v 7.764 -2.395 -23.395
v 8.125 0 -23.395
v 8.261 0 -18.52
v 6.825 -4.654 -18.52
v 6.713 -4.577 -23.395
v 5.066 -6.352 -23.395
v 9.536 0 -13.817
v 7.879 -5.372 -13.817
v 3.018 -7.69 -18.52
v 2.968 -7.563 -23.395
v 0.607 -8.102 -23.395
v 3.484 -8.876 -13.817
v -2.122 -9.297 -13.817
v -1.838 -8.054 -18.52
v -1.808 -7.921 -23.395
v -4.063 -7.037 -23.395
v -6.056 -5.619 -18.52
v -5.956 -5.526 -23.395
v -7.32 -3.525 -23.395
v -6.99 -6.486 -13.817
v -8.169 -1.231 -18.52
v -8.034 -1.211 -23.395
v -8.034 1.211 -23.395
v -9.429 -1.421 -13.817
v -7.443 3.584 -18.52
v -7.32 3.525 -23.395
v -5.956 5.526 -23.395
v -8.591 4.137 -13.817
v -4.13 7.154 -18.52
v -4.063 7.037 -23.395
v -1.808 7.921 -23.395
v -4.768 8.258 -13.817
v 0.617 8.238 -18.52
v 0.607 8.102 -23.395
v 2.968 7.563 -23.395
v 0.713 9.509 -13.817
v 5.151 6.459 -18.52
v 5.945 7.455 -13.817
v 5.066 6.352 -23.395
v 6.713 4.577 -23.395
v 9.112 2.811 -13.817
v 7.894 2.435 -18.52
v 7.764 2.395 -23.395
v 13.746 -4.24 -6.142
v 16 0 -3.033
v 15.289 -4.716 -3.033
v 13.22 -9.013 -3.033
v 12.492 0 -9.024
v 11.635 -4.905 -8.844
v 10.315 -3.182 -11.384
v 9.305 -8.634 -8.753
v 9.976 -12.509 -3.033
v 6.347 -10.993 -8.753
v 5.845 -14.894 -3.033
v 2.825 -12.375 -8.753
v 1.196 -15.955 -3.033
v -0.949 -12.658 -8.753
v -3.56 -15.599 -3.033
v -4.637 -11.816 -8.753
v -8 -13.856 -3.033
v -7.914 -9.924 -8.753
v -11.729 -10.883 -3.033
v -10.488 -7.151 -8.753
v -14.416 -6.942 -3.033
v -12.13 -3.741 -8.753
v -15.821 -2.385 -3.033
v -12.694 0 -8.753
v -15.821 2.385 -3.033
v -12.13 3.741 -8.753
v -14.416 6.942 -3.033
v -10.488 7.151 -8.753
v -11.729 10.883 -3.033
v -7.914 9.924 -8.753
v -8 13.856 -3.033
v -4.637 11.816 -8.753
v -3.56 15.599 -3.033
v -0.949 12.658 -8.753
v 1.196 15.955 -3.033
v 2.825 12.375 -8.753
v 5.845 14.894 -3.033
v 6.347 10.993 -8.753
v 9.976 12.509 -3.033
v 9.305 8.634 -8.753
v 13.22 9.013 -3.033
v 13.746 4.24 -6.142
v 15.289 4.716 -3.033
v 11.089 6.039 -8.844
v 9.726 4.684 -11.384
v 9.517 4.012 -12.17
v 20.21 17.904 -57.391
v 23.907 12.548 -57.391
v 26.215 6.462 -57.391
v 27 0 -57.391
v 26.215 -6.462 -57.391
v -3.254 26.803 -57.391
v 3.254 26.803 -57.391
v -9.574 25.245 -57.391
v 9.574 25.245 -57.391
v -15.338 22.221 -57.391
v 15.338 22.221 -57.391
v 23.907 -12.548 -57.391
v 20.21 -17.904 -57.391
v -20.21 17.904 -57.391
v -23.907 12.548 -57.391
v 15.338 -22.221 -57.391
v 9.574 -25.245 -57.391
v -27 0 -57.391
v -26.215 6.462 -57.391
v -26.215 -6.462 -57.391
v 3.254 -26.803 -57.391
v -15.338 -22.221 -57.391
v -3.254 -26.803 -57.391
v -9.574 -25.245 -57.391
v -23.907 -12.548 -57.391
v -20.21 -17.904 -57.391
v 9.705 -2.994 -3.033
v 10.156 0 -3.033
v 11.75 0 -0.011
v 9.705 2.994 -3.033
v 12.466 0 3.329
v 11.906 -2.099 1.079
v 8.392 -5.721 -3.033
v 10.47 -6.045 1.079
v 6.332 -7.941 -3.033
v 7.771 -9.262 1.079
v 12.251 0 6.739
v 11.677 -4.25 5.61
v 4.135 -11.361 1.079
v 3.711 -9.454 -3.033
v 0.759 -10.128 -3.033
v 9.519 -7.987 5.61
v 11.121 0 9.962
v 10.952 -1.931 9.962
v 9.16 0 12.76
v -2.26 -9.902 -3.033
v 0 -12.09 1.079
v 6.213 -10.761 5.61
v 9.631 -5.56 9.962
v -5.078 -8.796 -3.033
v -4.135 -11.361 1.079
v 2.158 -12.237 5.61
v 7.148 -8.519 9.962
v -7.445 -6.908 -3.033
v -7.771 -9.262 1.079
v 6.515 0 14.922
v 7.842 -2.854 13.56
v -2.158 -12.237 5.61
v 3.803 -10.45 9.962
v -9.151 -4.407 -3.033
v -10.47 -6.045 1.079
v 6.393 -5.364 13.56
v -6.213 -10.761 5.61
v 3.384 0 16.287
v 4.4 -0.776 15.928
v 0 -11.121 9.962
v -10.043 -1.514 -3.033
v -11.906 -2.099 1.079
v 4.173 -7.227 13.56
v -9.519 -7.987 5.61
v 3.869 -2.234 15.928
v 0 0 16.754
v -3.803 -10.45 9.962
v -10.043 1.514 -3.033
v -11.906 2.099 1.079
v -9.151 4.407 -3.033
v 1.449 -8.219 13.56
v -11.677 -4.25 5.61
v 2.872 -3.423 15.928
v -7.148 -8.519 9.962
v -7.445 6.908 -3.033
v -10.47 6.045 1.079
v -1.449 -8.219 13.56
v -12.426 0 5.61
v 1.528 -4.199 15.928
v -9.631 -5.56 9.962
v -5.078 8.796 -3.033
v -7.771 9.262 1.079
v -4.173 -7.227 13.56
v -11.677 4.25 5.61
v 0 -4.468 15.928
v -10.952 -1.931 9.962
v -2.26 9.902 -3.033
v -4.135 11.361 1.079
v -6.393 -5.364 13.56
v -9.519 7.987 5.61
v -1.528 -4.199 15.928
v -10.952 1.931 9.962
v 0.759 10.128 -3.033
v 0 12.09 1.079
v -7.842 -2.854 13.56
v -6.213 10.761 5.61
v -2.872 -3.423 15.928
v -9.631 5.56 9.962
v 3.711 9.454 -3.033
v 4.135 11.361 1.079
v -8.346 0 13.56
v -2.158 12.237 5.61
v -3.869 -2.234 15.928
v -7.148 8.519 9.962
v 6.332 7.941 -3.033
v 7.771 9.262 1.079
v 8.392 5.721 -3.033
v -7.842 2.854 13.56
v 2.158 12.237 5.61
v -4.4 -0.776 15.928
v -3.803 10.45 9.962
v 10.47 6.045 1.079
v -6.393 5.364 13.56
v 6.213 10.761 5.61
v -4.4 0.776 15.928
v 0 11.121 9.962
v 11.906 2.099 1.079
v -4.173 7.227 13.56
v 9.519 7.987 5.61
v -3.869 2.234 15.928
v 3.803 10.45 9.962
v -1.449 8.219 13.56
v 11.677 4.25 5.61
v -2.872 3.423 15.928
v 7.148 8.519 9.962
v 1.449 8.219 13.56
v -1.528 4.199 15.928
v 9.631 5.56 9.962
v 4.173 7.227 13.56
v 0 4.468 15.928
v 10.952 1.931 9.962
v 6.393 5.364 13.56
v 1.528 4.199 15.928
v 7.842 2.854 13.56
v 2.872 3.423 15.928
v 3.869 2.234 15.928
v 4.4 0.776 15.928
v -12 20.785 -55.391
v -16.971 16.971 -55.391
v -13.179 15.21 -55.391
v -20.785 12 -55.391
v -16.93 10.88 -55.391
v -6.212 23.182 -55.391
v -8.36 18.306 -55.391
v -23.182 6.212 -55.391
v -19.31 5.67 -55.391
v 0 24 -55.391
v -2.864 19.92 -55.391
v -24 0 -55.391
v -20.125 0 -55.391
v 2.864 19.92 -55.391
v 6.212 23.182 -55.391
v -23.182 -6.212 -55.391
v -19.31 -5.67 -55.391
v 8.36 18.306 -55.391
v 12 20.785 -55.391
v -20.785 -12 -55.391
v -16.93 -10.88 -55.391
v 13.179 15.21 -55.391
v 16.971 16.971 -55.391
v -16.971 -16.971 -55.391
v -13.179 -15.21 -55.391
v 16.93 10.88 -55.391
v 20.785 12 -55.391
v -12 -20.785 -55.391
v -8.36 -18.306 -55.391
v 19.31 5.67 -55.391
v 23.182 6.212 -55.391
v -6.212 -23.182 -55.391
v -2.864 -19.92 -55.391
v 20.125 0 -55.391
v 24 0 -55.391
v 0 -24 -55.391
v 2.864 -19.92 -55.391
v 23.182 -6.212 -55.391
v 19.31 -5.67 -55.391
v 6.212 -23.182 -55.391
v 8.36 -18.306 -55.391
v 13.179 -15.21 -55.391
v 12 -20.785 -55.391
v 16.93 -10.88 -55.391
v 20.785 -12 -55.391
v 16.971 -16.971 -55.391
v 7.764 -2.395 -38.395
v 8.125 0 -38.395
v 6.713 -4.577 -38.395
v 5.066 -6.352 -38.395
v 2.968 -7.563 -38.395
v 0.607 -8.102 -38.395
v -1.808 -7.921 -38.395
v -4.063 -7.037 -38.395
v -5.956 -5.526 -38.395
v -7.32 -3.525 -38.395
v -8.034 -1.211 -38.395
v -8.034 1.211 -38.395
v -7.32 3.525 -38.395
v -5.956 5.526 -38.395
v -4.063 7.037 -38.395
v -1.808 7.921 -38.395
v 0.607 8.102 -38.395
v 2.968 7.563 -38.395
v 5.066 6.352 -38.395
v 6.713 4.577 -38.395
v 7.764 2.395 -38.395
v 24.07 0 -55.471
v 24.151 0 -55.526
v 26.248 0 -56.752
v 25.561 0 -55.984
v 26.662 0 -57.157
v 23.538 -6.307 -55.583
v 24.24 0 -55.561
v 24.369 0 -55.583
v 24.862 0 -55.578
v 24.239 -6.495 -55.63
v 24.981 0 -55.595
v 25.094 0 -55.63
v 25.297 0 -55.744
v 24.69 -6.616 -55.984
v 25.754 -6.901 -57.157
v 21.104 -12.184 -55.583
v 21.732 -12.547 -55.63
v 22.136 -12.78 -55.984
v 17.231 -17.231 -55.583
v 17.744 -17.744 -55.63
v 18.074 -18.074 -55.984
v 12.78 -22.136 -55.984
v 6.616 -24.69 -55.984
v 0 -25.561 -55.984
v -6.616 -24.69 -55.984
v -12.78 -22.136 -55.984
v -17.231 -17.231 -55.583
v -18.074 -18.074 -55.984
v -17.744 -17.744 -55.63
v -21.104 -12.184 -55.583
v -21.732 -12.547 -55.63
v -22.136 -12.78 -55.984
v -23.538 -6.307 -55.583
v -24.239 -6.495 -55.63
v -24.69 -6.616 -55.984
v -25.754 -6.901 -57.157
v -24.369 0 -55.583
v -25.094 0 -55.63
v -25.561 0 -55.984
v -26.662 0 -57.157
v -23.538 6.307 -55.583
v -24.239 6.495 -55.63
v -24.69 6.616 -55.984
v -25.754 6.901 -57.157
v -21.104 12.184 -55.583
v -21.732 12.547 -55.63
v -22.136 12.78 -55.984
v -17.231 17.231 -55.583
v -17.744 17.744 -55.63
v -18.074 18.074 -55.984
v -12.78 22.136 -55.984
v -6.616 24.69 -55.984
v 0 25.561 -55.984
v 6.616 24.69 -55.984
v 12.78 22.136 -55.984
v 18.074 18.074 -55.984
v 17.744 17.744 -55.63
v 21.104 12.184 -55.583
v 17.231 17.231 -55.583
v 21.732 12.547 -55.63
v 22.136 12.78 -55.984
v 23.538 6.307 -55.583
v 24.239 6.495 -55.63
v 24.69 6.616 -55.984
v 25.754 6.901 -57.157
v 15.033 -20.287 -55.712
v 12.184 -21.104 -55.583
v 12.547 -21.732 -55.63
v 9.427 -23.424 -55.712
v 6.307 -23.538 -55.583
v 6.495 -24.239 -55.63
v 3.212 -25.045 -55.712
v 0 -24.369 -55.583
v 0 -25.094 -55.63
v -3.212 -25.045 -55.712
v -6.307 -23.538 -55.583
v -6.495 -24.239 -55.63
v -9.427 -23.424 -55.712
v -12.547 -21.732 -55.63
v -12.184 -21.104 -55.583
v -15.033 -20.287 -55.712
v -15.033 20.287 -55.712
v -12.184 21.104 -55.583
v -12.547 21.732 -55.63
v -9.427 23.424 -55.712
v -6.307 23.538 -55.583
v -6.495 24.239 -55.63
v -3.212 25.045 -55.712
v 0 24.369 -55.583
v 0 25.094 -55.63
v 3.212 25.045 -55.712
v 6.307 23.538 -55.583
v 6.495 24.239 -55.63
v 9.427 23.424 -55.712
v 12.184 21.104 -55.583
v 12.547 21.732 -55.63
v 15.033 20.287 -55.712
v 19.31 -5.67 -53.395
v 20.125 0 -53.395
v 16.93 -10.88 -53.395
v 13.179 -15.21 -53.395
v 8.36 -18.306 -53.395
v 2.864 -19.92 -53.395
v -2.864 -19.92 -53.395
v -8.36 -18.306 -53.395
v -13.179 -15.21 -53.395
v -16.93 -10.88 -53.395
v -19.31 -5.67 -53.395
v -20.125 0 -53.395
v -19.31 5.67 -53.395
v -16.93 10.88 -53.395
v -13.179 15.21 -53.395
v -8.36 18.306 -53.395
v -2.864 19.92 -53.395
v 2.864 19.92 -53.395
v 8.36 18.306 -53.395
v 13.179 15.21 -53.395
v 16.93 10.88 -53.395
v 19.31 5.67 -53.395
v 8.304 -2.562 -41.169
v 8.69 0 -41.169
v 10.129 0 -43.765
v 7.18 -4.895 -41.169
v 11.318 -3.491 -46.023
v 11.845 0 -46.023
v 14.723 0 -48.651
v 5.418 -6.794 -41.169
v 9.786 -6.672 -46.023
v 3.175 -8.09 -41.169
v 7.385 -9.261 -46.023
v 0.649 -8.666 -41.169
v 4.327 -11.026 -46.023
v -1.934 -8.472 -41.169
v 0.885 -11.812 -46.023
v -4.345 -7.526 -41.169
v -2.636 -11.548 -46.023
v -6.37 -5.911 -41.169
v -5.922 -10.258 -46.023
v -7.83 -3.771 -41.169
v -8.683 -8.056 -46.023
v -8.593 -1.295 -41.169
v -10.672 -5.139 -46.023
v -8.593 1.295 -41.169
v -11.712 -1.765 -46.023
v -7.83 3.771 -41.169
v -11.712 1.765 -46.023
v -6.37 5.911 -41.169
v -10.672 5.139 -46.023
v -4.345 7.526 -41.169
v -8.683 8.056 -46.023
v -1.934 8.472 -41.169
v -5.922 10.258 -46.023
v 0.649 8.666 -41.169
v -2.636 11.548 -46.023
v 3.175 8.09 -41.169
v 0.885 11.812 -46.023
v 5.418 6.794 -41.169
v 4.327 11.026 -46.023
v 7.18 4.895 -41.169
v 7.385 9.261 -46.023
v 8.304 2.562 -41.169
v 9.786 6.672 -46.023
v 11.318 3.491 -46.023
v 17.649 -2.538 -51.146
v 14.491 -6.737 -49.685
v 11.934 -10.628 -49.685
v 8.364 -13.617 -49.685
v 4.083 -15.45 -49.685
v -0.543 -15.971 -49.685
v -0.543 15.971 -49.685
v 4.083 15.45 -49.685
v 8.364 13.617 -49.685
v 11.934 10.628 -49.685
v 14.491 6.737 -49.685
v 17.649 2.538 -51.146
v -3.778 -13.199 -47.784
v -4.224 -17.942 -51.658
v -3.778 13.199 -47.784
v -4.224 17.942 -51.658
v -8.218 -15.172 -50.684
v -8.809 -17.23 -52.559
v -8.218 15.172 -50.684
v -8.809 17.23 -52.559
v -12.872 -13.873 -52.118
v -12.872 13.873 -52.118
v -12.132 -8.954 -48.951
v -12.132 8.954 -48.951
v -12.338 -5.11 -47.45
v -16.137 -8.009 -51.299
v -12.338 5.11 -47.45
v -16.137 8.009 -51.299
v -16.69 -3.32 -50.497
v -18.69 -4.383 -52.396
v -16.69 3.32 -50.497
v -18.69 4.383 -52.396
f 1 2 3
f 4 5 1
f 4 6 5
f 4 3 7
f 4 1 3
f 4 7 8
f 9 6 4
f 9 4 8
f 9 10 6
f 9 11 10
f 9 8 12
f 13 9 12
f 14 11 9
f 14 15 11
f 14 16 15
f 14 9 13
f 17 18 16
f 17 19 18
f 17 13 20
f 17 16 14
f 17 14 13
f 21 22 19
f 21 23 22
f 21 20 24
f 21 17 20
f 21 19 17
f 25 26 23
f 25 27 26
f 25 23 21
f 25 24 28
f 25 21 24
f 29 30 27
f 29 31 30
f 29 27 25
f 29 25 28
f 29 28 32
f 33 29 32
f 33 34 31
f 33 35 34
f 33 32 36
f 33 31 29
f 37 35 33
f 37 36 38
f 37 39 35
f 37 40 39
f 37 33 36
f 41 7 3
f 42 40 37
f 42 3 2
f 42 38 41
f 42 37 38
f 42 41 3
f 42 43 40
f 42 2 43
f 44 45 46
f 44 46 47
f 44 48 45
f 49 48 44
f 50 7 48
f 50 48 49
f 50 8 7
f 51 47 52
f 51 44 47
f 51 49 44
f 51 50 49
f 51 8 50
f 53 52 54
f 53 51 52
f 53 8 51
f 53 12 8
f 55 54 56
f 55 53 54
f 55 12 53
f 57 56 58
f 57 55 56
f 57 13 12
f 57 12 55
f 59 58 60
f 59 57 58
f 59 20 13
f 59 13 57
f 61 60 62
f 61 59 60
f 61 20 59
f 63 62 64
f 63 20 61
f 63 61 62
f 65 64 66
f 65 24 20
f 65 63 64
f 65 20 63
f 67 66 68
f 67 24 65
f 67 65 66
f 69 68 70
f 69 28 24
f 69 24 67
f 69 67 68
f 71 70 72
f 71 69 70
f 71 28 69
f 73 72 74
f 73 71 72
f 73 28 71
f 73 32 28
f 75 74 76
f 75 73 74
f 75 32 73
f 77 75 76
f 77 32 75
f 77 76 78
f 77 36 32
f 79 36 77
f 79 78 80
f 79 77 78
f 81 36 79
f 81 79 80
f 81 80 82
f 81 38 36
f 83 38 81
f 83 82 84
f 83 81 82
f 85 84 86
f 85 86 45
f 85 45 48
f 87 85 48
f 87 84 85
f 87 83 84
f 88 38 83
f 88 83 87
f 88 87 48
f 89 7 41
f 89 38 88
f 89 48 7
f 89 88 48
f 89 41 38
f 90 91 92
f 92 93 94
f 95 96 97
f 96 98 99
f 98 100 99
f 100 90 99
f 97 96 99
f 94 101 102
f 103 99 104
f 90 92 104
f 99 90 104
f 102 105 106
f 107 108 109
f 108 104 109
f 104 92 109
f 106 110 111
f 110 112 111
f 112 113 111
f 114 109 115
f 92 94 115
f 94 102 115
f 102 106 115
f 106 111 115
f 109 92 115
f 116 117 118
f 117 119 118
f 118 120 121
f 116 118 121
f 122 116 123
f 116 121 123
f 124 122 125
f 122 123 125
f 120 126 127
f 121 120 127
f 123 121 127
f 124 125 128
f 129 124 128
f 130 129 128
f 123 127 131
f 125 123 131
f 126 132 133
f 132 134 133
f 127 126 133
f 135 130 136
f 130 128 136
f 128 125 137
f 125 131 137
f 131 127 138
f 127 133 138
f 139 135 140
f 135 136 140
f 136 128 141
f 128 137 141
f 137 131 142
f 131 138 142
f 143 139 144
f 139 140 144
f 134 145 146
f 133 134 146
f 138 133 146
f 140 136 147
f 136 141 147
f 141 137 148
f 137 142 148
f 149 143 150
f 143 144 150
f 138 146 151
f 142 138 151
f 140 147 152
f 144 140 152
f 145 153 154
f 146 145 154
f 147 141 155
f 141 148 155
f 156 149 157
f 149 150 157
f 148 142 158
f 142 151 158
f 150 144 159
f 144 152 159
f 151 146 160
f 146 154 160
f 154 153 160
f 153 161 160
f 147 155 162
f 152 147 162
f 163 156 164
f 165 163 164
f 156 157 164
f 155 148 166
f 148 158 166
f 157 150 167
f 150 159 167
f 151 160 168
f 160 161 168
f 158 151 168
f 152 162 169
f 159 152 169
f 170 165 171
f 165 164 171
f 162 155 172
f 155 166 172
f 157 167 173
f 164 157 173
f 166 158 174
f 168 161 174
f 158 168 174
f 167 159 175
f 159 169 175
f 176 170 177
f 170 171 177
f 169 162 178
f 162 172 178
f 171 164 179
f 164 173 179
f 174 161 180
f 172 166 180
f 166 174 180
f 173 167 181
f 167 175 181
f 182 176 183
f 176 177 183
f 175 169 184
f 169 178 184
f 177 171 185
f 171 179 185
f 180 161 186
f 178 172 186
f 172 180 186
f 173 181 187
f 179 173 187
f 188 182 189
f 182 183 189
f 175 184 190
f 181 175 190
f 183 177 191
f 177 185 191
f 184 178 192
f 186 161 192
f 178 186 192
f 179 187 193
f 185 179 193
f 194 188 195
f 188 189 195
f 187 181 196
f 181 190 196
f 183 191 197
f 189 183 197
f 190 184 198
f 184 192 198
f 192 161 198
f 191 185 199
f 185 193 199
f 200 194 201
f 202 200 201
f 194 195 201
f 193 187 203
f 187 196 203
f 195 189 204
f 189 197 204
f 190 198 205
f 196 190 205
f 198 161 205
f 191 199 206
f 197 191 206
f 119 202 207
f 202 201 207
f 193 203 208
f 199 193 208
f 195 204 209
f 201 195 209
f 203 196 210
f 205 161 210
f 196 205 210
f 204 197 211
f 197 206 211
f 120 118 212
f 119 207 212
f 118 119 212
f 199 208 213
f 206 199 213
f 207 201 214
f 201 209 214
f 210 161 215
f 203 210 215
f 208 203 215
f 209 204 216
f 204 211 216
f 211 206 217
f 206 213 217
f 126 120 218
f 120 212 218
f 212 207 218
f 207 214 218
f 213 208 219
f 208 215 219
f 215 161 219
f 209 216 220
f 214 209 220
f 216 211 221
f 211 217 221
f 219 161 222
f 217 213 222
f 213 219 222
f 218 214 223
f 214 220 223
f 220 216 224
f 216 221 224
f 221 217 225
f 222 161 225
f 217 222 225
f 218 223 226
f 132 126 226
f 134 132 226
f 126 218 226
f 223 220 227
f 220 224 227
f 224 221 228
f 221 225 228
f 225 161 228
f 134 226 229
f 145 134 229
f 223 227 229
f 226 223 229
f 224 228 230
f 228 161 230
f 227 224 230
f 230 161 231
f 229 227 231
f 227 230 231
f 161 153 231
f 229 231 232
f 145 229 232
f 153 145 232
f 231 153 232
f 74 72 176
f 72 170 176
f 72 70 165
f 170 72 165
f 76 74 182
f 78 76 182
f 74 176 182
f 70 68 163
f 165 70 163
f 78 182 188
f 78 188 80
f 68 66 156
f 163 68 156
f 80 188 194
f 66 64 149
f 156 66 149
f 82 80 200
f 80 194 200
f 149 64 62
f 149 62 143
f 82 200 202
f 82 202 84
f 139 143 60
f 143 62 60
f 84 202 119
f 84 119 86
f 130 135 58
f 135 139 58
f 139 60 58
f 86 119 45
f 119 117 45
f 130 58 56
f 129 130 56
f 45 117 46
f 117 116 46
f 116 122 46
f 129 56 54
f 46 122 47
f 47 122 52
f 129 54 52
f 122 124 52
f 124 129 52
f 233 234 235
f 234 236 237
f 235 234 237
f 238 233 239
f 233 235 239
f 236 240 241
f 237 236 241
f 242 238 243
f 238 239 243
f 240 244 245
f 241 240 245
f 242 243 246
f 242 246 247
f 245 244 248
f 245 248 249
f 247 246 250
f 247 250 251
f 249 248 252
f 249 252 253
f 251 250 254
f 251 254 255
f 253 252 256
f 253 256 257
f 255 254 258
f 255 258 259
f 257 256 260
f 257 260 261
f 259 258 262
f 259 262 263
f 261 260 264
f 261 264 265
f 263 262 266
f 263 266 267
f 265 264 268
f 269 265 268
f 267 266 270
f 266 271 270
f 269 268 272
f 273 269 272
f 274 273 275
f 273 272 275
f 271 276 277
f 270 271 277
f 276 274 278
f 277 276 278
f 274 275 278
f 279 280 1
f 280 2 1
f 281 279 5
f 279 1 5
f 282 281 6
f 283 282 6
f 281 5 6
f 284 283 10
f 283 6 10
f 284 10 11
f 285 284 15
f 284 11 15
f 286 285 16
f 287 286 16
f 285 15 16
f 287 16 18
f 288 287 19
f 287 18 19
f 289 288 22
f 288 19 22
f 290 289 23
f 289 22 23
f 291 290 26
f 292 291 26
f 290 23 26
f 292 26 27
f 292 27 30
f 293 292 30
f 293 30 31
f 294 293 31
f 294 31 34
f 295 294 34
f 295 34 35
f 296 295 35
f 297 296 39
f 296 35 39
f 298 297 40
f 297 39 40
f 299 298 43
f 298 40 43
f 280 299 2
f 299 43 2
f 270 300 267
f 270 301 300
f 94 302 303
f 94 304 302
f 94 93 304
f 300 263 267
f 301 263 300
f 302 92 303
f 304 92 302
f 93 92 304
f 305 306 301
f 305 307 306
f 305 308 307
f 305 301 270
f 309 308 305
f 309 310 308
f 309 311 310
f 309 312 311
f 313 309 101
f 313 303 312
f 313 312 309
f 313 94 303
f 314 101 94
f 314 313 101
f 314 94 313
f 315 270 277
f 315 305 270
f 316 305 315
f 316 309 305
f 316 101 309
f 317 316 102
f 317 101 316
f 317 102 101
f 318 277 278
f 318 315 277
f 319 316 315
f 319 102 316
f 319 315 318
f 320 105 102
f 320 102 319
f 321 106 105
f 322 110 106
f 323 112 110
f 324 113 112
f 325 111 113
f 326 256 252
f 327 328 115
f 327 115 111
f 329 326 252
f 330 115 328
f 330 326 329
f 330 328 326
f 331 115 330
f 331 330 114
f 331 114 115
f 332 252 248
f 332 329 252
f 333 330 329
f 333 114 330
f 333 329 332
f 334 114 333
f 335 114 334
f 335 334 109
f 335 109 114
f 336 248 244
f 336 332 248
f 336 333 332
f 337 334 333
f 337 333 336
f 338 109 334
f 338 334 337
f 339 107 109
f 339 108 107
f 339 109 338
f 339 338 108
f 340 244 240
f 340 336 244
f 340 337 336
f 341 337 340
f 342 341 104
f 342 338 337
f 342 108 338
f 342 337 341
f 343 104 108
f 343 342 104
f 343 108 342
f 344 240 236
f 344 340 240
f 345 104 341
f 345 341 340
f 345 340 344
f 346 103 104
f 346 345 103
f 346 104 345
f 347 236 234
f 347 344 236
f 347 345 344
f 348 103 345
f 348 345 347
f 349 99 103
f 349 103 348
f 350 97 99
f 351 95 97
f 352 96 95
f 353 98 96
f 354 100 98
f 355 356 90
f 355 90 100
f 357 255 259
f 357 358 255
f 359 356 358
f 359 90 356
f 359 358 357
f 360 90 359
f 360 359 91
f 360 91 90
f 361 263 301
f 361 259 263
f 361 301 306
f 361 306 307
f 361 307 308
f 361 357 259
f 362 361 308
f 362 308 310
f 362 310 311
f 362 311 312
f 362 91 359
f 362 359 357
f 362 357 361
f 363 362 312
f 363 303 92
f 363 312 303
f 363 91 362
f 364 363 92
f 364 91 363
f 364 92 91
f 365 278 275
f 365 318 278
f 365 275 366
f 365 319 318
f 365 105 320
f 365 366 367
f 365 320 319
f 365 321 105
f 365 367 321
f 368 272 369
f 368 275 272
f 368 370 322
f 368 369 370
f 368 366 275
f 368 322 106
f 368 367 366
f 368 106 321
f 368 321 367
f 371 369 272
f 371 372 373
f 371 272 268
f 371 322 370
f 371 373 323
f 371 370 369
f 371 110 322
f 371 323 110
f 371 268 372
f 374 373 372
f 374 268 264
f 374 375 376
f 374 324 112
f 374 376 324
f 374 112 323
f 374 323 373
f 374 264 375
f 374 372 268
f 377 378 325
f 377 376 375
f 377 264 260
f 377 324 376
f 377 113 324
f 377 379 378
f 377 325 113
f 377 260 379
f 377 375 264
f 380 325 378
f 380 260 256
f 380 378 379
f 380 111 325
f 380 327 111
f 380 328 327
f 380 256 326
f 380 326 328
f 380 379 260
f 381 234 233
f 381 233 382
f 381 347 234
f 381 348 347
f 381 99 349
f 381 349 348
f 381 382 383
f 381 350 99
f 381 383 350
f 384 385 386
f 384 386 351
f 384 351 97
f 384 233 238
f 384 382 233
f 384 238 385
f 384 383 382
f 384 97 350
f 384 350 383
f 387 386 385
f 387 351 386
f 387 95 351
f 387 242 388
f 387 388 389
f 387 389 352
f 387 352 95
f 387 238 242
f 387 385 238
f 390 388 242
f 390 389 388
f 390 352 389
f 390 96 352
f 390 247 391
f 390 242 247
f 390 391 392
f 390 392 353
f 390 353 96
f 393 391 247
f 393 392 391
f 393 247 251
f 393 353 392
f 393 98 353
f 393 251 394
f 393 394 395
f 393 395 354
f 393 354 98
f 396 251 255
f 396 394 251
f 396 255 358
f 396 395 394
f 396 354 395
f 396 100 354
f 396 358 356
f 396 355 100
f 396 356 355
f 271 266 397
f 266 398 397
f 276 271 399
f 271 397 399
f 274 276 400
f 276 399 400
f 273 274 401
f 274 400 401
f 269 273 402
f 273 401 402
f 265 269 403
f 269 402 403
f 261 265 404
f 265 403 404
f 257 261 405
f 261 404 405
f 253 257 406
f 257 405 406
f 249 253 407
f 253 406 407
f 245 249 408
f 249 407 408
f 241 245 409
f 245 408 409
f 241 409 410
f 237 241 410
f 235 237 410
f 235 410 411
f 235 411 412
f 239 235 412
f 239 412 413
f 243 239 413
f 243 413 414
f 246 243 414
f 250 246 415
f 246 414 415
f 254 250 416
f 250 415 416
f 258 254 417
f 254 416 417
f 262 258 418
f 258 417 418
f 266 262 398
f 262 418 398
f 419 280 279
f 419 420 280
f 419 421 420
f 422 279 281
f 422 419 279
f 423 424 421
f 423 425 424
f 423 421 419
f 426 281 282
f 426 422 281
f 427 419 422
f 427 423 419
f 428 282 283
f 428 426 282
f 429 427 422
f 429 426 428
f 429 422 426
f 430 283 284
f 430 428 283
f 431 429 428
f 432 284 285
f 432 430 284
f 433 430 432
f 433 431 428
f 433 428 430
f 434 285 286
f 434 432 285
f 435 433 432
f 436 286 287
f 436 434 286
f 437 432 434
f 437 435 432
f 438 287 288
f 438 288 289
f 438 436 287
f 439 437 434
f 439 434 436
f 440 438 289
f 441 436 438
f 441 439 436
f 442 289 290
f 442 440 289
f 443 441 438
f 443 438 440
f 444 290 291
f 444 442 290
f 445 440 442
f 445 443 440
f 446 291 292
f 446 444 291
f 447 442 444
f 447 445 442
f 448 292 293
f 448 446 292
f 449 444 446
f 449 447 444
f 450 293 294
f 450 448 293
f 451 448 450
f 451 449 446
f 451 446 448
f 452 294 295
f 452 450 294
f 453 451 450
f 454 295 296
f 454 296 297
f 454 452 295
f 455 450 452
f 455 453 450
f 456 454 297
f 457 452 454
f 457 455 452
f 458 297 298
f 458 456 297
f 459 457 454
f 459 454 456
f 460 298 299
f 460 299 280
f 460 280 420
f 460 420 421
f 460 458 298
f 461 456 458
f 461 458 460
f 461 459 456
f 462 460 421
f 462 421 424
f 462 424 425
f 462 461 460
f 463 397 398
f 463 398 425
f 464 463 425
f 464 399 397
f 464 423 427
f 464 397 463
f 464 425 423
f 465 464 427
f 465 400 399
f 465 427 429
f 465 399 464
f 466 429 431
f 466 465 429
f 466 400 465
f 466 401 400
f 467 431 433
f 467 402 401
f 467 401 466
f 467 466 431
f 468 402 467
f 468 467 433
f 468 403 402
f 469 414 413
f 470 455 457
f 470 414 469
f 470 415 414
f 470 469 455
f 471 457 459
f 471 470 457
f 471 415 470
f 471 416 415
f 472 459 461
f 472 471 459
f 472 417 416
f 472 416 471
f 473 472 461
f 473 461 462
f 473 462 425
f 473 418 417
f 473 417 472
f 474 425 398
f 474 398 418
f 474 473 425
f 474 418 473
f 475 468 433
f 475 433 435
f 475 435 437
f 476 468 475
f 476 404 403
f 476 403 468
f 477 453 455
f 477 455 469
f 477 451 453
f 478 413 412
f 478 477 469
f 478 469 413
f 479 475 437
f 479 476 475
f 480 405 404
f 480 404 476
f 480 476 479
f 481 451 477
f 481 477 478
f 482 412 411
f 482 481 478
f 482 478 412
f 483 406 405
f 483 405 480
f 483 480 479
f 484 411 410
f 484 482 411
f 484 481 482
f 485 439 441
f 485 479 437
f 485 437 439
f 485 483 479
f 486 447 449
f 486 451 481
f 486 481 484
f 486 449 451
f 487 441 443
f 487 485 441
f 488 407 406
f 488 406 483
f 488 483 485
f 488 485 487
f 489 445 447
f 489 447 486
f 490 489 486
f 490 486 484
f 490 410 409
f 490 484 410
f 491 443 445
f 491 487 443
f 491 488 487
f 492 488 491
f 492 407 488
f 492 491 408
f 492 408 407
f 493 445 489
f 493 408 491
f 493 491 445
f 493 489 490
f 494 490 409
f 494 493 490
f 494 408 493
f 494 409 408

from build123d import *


with BuildPart() as f1:
    # F0 (on Front) → F1 (revolve)
    with BuildSketch(Plane.XZ):
        with BuildLine():
            Line((16, -3.0325458964), (10.156489074, -3.0325458964))
            ThreePointArc((10.156489074, -3.0325458964), (11.1205557598, 9.9623088209), (0, 16.7541357689))
            Line((0, 16.7541357689), (0, -57.3908457809))
            Line((0, -57.3908457809), (27, -57.3908457809))
            add(Edge.make_bspline(
                [(24, -55.3908457809), (24.2010240138, -55.6848697047), (24.9827368456, -55.418456841), (25.6920348647, -56.071646948), (26.5649689108, -57.1723348375), (27, -57.3908457809)],
                knots=[0, 0, 0, 0, 0.2895748436, 0.5861094922, 1, 1, 1, 1], degree=3))
            Line((24, -55.3908457809), (20.1250999048, -55.3908457809))
            Line((20.1250999048, -55.3908457809), (20.1250999048, -53.3952837876))
            add(Edge.make_bspline(
                [(8.1250999048, -38.3952837876), (8.2238268601, -39.256226922), (8.4270422726, -41.0122837603), (9.8982762171, -43.4578276996), (11.4699785181, -45.7659074202), (13.3620185574, -47.4600763108), (15.6729740321, -49.5107890058), (18.6728624517, -51.7149272684), (19.6509058696, -52.9012393598), (20.1250999048, -53.3952837876)],
                knots=[0, 0, 0, 0, 0.1374459581, 0.2809135322, 0.423155705, 0.557834342, 0.7094171995, 0.8739912416, 1, 1, 1, 1], degree=3))
            Line((8.1250999048, -38.3952837876), (8.1250999048, -23.3952837876))
            add(Edge.make_bspline(
                [(16, -3.0325458964), (15.2503831973, -4.4485089359), (13.8864897698, -7.4197825639), (10.9750037451, -10.8328260195), (9.2135463922, -14.223490226), (8.0311958908, -18.6320295706), (7.9799188419, -22.3621549734), (8.1250999048, -23.3952837876)],
                knots=[0, 0, 0, 0, 0.209262376, 0.4085991961, 0.5915248966, 0.7977911457, 1, 1, 1, 1], degree=3))
        make_face()
    revolve(axis=Axis((0, 0, -20.318355006), (0, 0, -1)))


solid = f1.part
